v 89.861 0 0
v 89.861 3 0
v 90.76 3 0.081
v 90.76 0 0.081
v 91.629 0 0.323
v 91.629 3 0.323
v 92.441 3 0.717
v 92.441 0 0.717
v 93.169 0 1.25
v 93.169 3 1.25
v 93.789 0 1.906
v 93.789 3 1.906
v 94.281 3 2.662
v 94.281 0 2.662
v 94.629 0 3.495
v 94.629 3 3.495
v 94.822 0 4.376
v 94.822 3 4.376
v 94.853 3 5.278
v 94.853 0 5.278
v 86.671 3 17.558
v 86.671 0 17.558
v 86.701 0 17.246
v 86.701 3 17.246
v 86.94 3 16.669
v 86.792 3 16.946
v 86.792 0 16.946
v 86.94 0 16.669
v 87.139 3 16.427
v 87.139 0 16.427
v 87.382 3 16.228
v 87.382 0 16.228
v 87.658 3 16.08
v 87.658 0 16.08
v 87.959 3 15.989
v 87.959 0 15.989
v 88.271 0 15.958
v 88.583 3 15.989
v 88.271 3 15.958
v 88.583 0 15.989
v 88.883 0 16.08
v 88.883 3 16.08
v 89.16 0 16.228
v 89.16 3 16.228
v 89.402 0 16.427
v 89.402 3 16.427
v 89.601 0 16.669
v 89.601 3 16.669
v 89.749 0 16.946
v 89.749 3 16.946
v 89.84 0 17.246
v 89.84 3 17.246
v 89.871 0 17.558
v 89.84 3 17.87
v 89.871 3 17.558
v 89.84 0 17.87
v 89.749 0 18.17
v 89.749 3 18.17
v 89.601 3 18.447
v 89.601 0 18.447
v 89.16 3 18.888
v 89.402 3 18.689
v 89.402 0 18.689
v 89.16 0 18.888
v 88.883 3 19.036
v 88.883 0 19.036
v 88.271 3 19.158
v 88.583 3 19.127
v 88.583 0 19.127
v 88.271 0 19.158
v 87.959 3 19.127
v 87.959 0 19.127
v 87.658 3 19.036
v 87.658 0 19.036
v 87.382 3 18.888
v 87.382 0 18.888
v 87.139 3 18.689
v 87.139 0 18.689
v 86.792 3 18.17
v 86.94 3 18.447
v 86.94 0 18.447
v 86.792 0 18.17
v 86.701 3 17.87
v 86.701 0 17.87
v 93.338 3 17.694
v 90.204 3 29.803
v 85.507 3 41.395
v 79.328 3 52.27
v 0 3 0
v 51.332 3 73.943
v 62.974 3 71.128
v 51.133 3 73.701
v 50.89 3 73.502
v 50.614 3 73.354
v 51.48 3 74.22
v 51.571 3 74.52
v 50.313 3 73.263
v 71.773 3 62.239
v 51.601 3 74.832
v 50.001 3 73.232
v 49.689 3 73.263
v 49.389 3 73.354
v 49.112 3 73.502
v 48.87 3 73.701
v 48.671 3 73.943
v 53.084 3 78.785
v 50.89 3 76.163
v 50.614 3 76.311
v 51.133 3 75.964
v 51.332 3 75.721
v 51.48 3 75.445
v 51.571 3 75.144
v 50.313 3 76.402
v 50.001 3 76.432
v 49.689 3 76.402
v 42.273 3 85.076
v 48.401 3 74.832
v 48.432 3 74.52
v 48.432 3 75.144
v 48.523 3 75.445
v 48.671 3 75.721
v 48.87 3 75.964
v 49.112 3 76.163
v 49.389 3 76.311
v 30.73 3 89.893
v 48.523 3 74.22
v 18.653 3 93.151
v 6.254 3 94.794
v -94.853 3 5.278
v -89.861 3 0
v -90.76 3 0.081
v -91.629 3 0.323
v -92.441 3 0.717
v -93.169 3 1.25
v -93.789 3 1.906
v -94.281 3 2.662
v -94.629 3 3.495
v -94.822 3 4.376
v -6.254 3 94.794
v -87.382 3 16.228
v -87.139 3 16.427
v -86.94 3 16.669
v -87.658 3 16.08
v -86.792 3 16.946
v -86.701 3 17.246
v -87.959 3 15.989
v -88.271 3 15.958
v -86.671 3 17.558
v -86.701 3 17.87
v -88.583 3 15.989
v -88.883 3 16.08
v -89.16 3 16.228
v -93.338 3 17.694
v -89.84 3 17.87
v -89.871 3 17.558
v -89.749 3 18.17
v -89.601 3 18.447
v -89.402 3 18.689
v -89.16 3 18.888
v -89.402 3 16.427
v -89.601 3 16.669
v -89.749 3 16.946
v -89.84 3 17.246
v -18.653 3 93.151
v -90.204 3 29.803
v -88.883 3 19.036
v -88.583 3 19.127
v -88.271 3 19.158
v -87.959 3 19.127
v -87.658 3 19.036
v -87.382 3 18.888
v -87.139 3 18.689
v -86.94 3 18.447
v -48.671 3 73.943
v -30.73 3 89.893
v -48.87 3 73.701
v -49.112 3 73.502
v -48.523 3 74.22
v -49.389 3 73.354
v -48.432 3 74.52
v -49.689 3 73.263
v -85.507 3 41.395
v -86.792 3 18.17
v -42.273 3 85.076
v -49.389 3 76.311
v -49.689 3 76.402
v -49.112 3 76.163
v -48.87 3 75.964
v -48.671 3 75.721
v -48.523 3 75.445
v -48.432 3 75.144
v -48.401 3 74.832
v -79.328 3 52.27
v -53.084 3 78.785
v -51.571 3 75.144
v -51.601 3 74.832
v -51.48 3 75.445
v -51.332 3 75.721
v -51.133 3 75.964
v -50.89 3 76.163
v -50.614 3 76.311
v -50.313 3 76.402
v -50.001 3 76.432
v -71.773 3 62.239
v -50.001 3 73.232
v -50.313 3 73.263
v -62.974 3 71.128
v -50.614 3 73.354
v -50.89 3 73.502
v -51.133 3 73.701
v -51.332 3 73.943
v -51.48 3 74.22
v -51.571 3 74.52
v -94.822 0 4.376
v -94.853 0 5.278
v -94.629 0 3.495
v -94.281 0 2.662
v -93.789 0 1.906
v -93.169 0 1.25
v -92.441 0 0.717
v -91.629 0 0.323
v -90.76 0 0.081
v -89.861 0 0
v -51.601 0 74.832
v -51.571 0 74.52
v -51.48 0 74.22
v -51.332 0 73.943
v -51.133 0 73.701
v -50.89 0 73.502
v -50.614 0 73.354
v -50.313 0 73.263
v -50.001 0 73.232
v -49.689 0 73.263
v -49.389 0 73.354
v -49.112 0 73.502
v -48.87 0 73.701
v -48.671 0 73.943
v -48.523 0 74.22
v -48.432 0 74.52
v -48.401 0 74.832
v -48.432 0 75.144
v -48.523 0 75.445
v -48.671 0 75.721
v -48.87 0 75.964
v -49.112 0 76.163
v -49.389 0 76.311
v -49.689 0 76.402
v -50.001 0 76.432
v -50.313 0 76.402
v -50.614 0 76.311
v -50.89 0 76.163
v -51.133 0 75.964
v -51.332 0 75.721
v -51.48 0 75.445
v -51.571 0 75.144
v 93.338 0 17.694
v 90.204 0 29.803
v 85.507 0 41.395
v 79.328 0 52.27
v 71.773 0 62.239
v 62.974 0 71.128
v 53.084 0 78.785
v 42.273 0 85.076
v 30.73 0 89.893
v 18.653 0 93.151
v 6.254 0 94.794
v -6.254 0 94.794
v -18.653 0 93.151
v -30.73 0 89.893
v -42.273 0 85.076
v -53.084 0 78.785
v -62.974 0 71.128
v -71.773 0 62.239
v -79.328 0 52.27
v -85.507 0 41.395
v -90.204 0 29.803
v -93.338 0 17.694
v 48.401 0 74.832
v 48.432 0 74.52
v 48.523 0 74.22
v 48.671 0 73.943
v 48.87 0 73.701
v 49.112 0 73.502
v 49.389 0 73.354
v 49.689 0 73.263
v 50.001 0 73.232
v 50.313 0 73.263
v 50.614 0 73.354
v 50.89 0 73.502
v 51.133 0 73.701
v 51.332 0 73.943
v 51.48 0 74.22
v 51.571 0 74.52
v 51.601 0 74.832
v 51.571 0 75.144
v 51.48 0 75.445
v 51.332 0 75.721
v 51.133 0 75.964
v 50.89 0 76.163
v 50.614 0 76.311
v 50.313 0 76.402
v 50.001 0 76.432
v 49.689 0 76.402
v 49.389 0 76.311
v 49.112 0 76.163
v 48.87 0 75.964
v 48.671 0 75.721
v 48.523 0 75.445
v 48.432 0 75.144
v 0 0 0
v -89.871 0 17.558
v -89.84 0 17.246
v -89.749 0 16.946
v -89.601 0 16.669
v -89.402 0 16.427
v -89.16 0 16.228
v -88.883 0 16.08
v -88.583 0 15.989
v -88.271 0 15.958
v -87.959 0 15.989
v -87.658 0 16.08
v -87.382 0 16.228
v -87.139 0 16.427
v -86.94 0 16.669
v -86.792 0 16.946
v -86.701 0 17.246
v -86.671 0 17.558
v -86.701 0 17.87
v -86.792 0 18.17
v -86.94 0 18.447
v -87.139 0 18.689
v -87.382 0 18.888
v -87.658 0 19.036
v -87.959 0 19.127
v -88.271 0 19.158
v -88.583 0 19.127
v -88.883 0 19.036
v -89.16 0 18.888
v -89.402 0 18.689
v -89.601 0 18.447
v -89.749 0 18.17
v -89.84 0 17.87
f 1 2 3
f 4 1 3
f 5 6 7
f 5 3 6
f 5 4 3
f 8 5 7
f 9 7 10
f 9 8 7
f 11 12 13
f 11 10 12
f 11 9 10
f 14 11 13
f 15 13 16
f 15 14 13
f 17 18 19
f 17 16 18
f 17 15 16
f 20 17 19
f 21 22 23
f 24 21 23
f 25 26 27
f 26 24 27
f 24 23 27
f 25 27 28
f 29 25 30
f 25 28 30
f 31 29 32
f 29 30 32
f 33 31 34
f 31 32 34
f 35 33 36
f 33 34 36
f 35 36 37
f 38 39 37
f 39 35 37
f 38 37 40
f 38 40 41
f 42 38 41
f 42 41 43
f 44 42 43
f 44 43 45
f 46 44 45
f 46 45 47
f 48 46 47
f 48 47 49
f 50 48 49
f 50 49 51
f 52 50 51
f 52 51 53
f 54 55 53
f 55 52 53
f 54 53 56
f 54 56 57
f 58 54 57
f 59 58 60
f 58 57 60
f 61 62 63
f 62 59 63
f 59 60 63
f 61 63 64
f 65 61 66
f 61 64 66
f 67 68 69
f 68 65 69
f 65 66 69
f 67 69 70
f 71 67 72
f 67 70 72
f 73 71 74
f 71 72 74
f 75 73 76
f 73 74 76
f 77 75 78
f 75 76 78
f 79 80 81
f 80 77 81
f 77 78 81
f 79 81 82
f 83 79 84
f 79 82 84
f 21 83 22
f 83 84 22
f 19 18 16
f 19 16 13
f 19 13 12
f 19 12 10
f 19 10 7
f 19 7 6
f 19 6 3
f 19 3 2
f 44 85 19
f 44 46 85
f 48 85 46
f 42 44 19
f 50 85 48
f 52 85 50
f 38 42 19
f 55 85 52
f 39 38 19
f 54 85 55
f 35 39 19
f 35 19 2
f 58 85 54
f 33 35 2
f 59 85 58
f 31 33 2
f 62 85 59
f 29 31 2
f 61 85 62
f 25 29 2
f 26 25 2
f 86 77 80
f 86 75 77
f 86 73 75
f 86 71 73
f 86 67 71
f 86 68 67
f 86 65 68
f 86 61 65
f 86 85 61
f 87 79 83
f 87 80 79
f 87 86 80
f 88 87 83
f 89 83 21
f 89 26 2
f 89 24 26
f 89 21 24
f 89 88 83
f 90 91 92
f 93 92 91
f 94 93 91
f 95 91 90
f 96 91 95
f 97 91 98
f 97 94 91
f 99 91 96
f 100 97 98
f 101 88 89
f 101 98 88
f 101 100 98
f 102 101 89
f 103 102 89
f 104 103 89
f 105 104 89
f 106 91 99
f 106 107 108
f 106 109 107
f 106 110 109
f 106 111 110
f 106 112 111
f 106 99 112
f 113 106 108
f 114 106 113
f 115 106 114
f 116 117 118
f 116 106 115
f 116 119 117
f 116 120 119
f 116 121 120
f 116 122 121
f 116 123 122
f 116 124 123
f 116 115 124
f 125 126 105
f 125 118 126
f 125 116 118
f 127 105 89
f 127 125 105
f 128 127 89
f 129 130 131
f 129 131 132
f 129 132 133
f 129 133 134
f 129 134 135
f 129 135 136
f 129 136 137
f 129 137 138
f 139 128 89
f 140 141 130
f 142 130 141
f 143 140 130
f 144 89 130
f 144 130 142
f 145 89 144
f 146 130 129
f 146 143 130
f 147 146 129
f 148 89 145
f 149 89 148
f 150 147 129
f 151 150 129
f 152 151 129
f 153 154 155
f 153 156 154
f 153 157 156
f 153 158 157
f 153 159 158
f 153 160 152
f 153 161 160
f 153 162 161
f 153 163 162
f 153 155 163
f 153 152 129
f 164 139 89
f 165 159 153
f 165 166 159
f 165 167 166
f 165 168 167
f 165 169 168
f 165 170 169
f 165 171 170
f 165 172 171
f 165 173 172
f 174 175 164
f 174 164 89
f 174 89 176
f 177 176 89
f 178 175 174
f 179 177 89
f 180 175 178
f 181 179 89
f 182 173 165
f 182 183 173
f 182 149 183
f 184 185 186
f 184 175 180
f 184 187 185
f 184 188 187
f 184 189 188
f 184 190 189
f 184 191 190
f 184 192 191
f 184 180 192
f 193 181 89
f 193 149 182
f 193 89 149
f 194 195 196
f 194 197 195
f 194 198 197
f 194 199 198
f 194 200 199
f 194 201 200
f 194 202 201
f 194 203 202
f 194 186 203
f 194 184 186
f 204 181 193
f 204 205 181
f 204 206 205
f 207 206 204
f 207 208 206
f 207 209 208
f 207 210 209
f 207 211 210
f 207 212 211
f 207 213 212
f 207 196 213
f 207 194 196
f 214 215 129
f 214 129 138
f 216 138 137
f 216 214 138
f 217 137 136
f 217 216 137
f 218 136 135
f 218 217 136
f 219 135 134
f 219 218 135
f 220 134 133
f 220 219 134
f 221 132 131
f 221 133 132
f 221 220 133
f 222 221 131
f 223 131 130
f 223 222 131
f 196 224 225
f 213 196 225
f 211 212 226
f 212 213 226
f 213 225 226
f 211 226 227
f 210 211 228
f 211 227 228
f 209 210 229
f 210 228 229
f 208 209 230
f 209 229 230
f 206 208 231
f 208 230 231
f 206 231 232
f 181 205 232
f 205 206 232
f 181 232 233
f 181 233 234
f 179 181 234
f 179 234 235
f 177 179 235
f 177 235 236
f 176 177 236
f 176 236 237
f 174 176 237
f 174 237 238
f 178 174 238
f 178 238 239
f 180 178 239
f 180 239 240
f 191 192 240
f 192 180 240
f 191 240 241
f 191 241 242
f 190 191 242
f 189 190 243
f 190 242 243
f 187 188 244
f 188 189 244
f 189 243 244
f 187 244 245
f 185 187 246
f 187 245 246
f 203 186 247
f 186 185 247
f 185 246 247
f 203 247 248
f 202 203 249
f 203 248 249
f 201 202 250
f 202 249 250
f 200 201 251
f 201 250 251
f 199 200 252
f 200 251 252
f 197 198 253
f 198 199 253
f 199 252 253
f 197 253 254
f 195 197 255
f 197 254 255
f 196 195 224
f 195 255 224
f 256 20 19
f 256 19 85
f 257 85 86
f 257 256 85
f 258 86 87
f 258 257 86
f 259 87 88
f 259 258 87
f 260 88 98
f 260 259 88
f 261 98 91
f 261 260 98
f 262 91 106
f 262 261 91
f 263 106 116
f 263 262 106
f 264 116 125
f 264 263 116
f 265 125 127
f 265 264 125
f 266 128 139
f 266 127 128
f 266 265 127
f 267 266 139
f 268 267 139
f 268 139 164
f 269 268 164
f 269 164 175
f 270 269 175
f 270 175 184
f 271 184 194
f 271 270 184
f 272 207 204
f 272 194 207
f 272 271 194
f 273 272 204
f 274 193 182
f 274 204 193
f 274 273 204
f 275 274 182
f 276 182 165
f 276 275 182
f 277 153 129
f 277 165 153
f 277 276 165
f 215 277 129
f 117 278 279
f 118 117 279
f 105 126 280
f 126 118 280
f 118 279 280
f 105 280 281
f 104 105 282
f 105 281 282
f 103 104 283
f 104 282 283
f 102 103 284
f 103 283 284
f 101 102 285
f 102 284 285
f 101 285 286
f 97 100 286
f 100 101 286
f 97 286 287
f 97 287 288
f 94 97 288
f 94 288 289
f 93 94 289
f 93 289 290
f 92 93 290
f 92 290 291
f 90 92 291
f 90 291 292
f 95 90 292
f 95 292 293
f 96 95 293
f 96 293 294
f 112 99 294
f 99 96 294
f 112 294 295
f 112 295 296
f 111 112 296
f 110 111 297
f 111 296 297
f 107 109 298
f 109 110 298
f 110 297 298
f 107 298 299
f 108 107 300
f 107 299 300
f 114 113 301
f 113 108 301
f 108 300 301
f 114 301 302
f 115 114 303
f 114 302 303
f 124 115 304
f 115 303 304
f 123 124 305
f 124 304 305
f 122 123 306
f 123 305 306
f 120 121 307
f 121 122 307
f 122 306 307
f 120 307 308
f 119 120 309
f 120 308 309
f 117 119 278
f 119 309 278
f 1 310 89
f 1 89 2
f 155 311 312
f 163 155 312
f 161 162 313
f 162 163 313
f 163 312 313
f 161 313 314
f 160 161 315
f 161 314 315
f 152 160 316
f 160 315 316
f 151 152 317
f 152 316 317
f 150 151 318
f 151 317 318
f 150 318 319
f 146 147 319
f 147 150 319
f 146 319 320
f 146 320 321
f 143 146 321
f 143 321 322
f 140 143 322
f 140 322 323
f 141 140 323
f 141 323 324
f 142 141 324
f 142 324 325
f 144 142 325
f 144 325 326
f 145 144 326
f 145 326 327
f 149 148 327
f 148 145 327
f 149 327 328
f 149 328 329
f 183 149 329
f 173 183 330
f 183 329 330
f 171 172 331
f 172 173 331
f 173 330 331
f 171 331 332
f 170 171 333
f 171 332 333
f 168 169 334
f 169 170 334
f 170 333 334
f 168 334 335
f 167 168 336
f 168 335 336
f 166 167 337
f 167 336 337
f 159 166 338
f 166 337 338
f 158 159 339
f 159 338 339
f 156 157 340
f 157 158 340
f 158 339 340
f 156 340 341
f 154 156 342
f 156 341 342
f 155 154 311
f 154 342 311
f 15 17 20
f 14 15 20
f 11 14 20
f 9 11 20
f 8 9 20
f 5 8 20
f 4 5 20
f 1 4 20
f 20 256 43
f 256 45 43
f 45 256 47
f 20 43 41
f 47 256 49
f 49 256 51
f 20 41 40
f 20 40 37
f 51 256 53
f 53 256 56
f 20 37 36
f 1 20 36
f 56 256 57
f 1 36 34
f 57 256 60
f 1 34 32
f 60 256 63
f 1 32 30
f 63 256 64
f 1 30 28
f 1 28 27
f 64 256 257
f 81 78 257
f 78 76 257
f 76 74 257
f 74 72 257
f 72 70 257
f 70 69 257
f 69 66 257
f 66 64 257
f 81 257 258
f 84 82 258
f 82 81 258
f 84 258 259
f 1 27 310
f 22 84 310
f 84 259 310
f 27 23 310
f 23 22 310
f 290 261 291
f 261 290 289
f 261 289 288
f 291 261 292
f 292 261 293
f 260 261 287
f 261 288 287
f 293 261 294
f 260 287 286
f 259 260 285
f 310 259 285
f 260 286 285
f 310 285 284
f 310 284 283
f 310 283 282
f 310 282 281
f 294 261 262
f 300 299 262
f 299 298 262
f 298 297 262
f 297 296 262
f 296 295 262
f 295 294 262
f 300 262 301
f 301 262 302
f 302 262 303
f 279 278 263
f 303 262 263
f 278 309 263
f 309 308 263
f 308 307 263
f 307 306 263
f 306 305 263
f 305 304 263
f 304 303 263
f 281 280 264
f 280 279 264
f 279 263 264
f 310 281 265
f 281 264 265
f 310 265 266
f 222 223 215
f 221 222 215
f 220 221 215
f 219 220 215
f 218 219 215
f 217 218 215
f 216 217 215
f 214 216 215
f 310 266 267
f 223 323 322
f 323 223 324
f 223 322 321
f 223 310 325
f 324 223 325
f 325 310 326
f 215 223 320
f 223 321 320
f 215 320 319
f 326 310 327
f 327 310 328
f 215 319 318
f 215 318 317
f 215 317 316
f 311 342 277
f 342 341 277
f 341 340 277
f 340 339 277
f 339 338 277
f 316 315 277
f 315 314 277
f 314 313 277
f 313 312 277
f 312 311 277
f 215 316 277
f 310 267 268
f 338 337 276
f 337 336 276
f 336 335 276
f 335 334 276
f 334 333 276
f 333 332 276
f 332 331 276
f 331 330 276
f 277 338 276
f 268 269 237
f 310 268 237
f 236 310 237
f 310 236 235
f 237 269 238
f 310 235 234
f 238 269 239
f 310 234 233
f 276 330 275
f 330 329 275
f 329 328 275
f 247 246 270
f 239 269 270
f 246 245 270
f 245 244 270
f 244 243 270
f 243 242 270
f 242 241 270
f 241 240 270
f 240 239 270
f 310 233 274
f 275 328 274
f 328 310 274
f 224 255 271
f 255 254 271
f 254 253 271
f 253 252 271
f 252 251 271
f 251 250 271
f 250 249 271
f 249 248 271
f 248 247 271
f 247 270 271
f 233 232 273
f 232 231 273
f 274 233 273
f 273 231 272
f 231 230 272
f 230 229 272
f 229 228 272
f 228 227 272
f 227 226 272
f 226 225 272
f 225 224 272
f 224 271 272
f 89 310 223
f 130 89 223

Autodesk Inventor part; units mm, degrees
ref_plane "YZ Plane" through (0, 0, 0) normal (1, 0, 0) x (0, 1, 0)
ref_plane "XZ Plane" through (0, 0, 0) normal (0, 1, 0) x (-1, 0, 0)
ref_plane "XY Plane" through (0, 0, 0) normal (0, 0, 1) x (1, 0, 0)
sketch "Sketch1" plane through (0, 0, 0) normal (0, 1, 0) x (-1, 0, 0)
  circle A0 centre (50.0013, 74.8323) radius 1.6
  circle A1 centre (-50.0013, 74.8323) radius 1.6
  circle A2 centre (-88.2707, 17.5581) radius 1.6
  circle A3 centre (88.2707, 17.5581) radius 1.6
  line L0 (0, 0) -> (89.861, 0)
  line L1 (0, 0) -> (-89.861, 0)
  arc A4 (94.8533, 5.2778) -> (-94.8533, 5.2778) centre (0, 0) ccw
  arc A5 (89.861, 0) -> (94.8533, 5.2778) centre (89.861, 5) ccw
  arc A6 (-94.8533, 5.2778) -> (-89.861, 0) centre (-89.861, 5) ccw
  point P0 (95, 0)
  point P1 (-95, 0)
  dimension "d39" = 3.2
  dimension "d40" = 3.2
  dimension "d41" = 3.2
  dimension "d43" = 5
extrude "Extrusion1" add sketch "Sketch1" along normal blind 3
properties part number "Top Plate"
